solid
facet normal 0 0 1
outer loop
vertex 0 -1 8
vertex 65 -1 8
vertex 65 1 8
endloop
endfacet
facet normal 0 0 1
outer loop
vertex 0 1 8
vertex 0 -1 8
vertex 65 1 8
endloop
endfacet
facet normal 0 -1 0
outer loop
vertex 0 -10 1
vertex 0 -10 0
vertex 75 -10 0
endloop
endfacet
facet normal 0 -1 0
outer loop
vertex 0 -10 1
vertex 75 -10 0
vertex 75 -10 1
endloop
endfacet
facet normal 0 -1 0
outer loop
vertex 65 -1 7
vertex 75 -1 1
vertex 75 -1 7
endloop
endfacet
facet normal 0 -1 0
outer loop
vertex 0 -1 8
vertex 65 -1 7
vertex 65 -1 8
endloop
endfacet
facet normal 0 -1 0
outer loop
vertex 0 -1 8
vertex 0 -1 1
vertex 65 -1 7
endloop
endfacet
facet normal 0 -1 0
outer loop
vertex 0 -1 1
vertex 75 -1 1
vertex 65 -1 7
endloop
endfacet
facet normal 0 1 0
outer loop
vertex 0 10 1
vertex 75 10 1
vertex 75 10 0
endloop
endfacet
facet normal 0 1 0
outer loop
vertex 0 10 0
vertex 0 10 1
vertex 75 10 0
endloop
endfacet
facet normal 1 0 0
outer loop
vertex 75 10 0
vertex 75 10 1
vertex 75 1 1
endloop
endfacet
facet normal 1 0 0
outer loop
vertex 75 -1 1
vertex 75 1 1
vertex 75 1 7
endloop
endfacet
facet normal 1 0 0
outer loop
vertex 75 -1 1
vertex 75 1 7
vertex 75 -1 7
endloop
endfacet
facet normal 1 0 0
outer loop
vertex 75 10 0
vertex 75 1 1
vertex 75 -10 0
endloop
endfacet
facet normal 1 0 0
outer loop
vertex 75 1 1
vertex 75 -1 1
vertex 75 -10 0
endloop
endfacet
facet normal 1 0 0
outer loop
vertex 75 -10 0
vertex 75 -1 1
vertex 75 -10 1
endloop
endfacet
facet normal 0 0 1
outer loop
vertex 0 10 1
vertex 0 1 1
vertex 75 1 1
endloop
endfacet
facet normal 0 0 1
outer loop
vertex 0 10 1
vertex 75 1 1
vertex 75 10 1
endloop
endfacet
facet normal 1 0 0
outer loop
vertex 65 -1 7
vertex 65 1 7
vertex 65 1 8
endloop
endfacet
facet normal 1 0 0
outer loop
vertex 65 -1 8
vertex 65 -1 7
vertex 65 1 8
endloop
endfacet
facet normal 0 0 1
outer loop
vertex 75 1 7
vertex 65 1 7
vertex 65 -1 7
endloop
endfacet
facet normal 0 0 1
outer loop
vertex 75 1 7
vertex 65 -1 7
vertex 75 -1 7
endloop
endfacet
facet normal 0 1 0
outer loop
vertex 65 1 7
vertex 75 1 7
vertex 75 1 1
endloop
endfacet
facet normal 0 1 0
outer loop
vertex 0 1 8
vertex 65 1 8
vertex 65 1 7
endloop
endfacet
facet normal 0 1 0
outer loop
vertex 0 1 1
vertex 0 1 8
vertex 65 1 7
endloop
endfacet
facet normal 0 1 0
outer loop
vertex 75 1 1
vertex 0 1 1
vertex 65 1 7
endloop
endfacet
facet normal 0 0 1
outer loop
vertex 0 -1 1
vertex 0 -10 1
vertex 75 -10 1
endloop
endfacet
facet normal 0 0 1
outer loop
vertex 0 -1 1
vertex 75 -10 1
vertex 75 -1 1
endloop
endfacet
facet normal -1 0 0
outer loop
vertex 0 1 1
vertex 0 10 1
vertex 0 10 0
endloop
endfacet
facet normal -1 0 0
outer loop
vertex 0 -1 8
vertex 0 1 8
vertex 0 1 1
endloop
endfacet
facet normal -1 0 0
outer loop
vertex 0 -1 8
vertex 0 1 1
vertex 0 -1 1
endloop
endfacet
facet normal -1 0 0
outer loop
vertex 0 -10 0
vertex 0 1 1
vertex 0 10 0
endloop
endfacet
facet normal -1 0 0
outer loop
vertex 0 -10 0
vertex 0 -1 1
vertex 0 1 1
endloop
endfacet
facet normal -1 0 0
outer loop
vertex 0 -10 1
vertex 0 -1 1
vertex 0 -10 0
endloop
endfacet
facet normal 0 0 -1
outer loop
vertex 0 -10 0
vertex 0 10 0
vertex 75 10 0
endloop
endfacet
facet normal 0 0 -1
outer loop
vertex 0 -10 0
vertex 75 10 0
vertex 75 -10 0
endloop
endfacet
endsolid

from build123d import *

# Parameters (mm, degrees)
PAD_DEPTH         = 75
SKETCH001_W       = 10
SKETCH001_H       = 1
POCKET_DEPTH      = 10.001
POCKET_DEPTH_BACK = -10.001


with BuildPart() as part:
    # Sketch → Pad (new body)
    with BuildSketch(Plane.YZ):
        Polygon((-10, 1), (-1, 1), (-1, 8), (1, 8), (1, 1), (10, 1), (10, 0), (-10, 0), align=None)
    extrude(amount=PAD_DEPTH)

    # Sketch001 → Pocket (cut, two sides)
    with BuildSketch(Plane.XZ) as pocket_sk:
        with Locations((70, 7.5)):
            Rectangle(SKETCH001_W, SKETCH001_H)
    extrude(amount=-POCKET_DEPTH, mode=Mode.SUBTRACT)
    extrude(pocket_sk.sketch, amount=-POCKET_DEPTH_BACK, mode=Mode.SUBTRACT)


solid = part.part
